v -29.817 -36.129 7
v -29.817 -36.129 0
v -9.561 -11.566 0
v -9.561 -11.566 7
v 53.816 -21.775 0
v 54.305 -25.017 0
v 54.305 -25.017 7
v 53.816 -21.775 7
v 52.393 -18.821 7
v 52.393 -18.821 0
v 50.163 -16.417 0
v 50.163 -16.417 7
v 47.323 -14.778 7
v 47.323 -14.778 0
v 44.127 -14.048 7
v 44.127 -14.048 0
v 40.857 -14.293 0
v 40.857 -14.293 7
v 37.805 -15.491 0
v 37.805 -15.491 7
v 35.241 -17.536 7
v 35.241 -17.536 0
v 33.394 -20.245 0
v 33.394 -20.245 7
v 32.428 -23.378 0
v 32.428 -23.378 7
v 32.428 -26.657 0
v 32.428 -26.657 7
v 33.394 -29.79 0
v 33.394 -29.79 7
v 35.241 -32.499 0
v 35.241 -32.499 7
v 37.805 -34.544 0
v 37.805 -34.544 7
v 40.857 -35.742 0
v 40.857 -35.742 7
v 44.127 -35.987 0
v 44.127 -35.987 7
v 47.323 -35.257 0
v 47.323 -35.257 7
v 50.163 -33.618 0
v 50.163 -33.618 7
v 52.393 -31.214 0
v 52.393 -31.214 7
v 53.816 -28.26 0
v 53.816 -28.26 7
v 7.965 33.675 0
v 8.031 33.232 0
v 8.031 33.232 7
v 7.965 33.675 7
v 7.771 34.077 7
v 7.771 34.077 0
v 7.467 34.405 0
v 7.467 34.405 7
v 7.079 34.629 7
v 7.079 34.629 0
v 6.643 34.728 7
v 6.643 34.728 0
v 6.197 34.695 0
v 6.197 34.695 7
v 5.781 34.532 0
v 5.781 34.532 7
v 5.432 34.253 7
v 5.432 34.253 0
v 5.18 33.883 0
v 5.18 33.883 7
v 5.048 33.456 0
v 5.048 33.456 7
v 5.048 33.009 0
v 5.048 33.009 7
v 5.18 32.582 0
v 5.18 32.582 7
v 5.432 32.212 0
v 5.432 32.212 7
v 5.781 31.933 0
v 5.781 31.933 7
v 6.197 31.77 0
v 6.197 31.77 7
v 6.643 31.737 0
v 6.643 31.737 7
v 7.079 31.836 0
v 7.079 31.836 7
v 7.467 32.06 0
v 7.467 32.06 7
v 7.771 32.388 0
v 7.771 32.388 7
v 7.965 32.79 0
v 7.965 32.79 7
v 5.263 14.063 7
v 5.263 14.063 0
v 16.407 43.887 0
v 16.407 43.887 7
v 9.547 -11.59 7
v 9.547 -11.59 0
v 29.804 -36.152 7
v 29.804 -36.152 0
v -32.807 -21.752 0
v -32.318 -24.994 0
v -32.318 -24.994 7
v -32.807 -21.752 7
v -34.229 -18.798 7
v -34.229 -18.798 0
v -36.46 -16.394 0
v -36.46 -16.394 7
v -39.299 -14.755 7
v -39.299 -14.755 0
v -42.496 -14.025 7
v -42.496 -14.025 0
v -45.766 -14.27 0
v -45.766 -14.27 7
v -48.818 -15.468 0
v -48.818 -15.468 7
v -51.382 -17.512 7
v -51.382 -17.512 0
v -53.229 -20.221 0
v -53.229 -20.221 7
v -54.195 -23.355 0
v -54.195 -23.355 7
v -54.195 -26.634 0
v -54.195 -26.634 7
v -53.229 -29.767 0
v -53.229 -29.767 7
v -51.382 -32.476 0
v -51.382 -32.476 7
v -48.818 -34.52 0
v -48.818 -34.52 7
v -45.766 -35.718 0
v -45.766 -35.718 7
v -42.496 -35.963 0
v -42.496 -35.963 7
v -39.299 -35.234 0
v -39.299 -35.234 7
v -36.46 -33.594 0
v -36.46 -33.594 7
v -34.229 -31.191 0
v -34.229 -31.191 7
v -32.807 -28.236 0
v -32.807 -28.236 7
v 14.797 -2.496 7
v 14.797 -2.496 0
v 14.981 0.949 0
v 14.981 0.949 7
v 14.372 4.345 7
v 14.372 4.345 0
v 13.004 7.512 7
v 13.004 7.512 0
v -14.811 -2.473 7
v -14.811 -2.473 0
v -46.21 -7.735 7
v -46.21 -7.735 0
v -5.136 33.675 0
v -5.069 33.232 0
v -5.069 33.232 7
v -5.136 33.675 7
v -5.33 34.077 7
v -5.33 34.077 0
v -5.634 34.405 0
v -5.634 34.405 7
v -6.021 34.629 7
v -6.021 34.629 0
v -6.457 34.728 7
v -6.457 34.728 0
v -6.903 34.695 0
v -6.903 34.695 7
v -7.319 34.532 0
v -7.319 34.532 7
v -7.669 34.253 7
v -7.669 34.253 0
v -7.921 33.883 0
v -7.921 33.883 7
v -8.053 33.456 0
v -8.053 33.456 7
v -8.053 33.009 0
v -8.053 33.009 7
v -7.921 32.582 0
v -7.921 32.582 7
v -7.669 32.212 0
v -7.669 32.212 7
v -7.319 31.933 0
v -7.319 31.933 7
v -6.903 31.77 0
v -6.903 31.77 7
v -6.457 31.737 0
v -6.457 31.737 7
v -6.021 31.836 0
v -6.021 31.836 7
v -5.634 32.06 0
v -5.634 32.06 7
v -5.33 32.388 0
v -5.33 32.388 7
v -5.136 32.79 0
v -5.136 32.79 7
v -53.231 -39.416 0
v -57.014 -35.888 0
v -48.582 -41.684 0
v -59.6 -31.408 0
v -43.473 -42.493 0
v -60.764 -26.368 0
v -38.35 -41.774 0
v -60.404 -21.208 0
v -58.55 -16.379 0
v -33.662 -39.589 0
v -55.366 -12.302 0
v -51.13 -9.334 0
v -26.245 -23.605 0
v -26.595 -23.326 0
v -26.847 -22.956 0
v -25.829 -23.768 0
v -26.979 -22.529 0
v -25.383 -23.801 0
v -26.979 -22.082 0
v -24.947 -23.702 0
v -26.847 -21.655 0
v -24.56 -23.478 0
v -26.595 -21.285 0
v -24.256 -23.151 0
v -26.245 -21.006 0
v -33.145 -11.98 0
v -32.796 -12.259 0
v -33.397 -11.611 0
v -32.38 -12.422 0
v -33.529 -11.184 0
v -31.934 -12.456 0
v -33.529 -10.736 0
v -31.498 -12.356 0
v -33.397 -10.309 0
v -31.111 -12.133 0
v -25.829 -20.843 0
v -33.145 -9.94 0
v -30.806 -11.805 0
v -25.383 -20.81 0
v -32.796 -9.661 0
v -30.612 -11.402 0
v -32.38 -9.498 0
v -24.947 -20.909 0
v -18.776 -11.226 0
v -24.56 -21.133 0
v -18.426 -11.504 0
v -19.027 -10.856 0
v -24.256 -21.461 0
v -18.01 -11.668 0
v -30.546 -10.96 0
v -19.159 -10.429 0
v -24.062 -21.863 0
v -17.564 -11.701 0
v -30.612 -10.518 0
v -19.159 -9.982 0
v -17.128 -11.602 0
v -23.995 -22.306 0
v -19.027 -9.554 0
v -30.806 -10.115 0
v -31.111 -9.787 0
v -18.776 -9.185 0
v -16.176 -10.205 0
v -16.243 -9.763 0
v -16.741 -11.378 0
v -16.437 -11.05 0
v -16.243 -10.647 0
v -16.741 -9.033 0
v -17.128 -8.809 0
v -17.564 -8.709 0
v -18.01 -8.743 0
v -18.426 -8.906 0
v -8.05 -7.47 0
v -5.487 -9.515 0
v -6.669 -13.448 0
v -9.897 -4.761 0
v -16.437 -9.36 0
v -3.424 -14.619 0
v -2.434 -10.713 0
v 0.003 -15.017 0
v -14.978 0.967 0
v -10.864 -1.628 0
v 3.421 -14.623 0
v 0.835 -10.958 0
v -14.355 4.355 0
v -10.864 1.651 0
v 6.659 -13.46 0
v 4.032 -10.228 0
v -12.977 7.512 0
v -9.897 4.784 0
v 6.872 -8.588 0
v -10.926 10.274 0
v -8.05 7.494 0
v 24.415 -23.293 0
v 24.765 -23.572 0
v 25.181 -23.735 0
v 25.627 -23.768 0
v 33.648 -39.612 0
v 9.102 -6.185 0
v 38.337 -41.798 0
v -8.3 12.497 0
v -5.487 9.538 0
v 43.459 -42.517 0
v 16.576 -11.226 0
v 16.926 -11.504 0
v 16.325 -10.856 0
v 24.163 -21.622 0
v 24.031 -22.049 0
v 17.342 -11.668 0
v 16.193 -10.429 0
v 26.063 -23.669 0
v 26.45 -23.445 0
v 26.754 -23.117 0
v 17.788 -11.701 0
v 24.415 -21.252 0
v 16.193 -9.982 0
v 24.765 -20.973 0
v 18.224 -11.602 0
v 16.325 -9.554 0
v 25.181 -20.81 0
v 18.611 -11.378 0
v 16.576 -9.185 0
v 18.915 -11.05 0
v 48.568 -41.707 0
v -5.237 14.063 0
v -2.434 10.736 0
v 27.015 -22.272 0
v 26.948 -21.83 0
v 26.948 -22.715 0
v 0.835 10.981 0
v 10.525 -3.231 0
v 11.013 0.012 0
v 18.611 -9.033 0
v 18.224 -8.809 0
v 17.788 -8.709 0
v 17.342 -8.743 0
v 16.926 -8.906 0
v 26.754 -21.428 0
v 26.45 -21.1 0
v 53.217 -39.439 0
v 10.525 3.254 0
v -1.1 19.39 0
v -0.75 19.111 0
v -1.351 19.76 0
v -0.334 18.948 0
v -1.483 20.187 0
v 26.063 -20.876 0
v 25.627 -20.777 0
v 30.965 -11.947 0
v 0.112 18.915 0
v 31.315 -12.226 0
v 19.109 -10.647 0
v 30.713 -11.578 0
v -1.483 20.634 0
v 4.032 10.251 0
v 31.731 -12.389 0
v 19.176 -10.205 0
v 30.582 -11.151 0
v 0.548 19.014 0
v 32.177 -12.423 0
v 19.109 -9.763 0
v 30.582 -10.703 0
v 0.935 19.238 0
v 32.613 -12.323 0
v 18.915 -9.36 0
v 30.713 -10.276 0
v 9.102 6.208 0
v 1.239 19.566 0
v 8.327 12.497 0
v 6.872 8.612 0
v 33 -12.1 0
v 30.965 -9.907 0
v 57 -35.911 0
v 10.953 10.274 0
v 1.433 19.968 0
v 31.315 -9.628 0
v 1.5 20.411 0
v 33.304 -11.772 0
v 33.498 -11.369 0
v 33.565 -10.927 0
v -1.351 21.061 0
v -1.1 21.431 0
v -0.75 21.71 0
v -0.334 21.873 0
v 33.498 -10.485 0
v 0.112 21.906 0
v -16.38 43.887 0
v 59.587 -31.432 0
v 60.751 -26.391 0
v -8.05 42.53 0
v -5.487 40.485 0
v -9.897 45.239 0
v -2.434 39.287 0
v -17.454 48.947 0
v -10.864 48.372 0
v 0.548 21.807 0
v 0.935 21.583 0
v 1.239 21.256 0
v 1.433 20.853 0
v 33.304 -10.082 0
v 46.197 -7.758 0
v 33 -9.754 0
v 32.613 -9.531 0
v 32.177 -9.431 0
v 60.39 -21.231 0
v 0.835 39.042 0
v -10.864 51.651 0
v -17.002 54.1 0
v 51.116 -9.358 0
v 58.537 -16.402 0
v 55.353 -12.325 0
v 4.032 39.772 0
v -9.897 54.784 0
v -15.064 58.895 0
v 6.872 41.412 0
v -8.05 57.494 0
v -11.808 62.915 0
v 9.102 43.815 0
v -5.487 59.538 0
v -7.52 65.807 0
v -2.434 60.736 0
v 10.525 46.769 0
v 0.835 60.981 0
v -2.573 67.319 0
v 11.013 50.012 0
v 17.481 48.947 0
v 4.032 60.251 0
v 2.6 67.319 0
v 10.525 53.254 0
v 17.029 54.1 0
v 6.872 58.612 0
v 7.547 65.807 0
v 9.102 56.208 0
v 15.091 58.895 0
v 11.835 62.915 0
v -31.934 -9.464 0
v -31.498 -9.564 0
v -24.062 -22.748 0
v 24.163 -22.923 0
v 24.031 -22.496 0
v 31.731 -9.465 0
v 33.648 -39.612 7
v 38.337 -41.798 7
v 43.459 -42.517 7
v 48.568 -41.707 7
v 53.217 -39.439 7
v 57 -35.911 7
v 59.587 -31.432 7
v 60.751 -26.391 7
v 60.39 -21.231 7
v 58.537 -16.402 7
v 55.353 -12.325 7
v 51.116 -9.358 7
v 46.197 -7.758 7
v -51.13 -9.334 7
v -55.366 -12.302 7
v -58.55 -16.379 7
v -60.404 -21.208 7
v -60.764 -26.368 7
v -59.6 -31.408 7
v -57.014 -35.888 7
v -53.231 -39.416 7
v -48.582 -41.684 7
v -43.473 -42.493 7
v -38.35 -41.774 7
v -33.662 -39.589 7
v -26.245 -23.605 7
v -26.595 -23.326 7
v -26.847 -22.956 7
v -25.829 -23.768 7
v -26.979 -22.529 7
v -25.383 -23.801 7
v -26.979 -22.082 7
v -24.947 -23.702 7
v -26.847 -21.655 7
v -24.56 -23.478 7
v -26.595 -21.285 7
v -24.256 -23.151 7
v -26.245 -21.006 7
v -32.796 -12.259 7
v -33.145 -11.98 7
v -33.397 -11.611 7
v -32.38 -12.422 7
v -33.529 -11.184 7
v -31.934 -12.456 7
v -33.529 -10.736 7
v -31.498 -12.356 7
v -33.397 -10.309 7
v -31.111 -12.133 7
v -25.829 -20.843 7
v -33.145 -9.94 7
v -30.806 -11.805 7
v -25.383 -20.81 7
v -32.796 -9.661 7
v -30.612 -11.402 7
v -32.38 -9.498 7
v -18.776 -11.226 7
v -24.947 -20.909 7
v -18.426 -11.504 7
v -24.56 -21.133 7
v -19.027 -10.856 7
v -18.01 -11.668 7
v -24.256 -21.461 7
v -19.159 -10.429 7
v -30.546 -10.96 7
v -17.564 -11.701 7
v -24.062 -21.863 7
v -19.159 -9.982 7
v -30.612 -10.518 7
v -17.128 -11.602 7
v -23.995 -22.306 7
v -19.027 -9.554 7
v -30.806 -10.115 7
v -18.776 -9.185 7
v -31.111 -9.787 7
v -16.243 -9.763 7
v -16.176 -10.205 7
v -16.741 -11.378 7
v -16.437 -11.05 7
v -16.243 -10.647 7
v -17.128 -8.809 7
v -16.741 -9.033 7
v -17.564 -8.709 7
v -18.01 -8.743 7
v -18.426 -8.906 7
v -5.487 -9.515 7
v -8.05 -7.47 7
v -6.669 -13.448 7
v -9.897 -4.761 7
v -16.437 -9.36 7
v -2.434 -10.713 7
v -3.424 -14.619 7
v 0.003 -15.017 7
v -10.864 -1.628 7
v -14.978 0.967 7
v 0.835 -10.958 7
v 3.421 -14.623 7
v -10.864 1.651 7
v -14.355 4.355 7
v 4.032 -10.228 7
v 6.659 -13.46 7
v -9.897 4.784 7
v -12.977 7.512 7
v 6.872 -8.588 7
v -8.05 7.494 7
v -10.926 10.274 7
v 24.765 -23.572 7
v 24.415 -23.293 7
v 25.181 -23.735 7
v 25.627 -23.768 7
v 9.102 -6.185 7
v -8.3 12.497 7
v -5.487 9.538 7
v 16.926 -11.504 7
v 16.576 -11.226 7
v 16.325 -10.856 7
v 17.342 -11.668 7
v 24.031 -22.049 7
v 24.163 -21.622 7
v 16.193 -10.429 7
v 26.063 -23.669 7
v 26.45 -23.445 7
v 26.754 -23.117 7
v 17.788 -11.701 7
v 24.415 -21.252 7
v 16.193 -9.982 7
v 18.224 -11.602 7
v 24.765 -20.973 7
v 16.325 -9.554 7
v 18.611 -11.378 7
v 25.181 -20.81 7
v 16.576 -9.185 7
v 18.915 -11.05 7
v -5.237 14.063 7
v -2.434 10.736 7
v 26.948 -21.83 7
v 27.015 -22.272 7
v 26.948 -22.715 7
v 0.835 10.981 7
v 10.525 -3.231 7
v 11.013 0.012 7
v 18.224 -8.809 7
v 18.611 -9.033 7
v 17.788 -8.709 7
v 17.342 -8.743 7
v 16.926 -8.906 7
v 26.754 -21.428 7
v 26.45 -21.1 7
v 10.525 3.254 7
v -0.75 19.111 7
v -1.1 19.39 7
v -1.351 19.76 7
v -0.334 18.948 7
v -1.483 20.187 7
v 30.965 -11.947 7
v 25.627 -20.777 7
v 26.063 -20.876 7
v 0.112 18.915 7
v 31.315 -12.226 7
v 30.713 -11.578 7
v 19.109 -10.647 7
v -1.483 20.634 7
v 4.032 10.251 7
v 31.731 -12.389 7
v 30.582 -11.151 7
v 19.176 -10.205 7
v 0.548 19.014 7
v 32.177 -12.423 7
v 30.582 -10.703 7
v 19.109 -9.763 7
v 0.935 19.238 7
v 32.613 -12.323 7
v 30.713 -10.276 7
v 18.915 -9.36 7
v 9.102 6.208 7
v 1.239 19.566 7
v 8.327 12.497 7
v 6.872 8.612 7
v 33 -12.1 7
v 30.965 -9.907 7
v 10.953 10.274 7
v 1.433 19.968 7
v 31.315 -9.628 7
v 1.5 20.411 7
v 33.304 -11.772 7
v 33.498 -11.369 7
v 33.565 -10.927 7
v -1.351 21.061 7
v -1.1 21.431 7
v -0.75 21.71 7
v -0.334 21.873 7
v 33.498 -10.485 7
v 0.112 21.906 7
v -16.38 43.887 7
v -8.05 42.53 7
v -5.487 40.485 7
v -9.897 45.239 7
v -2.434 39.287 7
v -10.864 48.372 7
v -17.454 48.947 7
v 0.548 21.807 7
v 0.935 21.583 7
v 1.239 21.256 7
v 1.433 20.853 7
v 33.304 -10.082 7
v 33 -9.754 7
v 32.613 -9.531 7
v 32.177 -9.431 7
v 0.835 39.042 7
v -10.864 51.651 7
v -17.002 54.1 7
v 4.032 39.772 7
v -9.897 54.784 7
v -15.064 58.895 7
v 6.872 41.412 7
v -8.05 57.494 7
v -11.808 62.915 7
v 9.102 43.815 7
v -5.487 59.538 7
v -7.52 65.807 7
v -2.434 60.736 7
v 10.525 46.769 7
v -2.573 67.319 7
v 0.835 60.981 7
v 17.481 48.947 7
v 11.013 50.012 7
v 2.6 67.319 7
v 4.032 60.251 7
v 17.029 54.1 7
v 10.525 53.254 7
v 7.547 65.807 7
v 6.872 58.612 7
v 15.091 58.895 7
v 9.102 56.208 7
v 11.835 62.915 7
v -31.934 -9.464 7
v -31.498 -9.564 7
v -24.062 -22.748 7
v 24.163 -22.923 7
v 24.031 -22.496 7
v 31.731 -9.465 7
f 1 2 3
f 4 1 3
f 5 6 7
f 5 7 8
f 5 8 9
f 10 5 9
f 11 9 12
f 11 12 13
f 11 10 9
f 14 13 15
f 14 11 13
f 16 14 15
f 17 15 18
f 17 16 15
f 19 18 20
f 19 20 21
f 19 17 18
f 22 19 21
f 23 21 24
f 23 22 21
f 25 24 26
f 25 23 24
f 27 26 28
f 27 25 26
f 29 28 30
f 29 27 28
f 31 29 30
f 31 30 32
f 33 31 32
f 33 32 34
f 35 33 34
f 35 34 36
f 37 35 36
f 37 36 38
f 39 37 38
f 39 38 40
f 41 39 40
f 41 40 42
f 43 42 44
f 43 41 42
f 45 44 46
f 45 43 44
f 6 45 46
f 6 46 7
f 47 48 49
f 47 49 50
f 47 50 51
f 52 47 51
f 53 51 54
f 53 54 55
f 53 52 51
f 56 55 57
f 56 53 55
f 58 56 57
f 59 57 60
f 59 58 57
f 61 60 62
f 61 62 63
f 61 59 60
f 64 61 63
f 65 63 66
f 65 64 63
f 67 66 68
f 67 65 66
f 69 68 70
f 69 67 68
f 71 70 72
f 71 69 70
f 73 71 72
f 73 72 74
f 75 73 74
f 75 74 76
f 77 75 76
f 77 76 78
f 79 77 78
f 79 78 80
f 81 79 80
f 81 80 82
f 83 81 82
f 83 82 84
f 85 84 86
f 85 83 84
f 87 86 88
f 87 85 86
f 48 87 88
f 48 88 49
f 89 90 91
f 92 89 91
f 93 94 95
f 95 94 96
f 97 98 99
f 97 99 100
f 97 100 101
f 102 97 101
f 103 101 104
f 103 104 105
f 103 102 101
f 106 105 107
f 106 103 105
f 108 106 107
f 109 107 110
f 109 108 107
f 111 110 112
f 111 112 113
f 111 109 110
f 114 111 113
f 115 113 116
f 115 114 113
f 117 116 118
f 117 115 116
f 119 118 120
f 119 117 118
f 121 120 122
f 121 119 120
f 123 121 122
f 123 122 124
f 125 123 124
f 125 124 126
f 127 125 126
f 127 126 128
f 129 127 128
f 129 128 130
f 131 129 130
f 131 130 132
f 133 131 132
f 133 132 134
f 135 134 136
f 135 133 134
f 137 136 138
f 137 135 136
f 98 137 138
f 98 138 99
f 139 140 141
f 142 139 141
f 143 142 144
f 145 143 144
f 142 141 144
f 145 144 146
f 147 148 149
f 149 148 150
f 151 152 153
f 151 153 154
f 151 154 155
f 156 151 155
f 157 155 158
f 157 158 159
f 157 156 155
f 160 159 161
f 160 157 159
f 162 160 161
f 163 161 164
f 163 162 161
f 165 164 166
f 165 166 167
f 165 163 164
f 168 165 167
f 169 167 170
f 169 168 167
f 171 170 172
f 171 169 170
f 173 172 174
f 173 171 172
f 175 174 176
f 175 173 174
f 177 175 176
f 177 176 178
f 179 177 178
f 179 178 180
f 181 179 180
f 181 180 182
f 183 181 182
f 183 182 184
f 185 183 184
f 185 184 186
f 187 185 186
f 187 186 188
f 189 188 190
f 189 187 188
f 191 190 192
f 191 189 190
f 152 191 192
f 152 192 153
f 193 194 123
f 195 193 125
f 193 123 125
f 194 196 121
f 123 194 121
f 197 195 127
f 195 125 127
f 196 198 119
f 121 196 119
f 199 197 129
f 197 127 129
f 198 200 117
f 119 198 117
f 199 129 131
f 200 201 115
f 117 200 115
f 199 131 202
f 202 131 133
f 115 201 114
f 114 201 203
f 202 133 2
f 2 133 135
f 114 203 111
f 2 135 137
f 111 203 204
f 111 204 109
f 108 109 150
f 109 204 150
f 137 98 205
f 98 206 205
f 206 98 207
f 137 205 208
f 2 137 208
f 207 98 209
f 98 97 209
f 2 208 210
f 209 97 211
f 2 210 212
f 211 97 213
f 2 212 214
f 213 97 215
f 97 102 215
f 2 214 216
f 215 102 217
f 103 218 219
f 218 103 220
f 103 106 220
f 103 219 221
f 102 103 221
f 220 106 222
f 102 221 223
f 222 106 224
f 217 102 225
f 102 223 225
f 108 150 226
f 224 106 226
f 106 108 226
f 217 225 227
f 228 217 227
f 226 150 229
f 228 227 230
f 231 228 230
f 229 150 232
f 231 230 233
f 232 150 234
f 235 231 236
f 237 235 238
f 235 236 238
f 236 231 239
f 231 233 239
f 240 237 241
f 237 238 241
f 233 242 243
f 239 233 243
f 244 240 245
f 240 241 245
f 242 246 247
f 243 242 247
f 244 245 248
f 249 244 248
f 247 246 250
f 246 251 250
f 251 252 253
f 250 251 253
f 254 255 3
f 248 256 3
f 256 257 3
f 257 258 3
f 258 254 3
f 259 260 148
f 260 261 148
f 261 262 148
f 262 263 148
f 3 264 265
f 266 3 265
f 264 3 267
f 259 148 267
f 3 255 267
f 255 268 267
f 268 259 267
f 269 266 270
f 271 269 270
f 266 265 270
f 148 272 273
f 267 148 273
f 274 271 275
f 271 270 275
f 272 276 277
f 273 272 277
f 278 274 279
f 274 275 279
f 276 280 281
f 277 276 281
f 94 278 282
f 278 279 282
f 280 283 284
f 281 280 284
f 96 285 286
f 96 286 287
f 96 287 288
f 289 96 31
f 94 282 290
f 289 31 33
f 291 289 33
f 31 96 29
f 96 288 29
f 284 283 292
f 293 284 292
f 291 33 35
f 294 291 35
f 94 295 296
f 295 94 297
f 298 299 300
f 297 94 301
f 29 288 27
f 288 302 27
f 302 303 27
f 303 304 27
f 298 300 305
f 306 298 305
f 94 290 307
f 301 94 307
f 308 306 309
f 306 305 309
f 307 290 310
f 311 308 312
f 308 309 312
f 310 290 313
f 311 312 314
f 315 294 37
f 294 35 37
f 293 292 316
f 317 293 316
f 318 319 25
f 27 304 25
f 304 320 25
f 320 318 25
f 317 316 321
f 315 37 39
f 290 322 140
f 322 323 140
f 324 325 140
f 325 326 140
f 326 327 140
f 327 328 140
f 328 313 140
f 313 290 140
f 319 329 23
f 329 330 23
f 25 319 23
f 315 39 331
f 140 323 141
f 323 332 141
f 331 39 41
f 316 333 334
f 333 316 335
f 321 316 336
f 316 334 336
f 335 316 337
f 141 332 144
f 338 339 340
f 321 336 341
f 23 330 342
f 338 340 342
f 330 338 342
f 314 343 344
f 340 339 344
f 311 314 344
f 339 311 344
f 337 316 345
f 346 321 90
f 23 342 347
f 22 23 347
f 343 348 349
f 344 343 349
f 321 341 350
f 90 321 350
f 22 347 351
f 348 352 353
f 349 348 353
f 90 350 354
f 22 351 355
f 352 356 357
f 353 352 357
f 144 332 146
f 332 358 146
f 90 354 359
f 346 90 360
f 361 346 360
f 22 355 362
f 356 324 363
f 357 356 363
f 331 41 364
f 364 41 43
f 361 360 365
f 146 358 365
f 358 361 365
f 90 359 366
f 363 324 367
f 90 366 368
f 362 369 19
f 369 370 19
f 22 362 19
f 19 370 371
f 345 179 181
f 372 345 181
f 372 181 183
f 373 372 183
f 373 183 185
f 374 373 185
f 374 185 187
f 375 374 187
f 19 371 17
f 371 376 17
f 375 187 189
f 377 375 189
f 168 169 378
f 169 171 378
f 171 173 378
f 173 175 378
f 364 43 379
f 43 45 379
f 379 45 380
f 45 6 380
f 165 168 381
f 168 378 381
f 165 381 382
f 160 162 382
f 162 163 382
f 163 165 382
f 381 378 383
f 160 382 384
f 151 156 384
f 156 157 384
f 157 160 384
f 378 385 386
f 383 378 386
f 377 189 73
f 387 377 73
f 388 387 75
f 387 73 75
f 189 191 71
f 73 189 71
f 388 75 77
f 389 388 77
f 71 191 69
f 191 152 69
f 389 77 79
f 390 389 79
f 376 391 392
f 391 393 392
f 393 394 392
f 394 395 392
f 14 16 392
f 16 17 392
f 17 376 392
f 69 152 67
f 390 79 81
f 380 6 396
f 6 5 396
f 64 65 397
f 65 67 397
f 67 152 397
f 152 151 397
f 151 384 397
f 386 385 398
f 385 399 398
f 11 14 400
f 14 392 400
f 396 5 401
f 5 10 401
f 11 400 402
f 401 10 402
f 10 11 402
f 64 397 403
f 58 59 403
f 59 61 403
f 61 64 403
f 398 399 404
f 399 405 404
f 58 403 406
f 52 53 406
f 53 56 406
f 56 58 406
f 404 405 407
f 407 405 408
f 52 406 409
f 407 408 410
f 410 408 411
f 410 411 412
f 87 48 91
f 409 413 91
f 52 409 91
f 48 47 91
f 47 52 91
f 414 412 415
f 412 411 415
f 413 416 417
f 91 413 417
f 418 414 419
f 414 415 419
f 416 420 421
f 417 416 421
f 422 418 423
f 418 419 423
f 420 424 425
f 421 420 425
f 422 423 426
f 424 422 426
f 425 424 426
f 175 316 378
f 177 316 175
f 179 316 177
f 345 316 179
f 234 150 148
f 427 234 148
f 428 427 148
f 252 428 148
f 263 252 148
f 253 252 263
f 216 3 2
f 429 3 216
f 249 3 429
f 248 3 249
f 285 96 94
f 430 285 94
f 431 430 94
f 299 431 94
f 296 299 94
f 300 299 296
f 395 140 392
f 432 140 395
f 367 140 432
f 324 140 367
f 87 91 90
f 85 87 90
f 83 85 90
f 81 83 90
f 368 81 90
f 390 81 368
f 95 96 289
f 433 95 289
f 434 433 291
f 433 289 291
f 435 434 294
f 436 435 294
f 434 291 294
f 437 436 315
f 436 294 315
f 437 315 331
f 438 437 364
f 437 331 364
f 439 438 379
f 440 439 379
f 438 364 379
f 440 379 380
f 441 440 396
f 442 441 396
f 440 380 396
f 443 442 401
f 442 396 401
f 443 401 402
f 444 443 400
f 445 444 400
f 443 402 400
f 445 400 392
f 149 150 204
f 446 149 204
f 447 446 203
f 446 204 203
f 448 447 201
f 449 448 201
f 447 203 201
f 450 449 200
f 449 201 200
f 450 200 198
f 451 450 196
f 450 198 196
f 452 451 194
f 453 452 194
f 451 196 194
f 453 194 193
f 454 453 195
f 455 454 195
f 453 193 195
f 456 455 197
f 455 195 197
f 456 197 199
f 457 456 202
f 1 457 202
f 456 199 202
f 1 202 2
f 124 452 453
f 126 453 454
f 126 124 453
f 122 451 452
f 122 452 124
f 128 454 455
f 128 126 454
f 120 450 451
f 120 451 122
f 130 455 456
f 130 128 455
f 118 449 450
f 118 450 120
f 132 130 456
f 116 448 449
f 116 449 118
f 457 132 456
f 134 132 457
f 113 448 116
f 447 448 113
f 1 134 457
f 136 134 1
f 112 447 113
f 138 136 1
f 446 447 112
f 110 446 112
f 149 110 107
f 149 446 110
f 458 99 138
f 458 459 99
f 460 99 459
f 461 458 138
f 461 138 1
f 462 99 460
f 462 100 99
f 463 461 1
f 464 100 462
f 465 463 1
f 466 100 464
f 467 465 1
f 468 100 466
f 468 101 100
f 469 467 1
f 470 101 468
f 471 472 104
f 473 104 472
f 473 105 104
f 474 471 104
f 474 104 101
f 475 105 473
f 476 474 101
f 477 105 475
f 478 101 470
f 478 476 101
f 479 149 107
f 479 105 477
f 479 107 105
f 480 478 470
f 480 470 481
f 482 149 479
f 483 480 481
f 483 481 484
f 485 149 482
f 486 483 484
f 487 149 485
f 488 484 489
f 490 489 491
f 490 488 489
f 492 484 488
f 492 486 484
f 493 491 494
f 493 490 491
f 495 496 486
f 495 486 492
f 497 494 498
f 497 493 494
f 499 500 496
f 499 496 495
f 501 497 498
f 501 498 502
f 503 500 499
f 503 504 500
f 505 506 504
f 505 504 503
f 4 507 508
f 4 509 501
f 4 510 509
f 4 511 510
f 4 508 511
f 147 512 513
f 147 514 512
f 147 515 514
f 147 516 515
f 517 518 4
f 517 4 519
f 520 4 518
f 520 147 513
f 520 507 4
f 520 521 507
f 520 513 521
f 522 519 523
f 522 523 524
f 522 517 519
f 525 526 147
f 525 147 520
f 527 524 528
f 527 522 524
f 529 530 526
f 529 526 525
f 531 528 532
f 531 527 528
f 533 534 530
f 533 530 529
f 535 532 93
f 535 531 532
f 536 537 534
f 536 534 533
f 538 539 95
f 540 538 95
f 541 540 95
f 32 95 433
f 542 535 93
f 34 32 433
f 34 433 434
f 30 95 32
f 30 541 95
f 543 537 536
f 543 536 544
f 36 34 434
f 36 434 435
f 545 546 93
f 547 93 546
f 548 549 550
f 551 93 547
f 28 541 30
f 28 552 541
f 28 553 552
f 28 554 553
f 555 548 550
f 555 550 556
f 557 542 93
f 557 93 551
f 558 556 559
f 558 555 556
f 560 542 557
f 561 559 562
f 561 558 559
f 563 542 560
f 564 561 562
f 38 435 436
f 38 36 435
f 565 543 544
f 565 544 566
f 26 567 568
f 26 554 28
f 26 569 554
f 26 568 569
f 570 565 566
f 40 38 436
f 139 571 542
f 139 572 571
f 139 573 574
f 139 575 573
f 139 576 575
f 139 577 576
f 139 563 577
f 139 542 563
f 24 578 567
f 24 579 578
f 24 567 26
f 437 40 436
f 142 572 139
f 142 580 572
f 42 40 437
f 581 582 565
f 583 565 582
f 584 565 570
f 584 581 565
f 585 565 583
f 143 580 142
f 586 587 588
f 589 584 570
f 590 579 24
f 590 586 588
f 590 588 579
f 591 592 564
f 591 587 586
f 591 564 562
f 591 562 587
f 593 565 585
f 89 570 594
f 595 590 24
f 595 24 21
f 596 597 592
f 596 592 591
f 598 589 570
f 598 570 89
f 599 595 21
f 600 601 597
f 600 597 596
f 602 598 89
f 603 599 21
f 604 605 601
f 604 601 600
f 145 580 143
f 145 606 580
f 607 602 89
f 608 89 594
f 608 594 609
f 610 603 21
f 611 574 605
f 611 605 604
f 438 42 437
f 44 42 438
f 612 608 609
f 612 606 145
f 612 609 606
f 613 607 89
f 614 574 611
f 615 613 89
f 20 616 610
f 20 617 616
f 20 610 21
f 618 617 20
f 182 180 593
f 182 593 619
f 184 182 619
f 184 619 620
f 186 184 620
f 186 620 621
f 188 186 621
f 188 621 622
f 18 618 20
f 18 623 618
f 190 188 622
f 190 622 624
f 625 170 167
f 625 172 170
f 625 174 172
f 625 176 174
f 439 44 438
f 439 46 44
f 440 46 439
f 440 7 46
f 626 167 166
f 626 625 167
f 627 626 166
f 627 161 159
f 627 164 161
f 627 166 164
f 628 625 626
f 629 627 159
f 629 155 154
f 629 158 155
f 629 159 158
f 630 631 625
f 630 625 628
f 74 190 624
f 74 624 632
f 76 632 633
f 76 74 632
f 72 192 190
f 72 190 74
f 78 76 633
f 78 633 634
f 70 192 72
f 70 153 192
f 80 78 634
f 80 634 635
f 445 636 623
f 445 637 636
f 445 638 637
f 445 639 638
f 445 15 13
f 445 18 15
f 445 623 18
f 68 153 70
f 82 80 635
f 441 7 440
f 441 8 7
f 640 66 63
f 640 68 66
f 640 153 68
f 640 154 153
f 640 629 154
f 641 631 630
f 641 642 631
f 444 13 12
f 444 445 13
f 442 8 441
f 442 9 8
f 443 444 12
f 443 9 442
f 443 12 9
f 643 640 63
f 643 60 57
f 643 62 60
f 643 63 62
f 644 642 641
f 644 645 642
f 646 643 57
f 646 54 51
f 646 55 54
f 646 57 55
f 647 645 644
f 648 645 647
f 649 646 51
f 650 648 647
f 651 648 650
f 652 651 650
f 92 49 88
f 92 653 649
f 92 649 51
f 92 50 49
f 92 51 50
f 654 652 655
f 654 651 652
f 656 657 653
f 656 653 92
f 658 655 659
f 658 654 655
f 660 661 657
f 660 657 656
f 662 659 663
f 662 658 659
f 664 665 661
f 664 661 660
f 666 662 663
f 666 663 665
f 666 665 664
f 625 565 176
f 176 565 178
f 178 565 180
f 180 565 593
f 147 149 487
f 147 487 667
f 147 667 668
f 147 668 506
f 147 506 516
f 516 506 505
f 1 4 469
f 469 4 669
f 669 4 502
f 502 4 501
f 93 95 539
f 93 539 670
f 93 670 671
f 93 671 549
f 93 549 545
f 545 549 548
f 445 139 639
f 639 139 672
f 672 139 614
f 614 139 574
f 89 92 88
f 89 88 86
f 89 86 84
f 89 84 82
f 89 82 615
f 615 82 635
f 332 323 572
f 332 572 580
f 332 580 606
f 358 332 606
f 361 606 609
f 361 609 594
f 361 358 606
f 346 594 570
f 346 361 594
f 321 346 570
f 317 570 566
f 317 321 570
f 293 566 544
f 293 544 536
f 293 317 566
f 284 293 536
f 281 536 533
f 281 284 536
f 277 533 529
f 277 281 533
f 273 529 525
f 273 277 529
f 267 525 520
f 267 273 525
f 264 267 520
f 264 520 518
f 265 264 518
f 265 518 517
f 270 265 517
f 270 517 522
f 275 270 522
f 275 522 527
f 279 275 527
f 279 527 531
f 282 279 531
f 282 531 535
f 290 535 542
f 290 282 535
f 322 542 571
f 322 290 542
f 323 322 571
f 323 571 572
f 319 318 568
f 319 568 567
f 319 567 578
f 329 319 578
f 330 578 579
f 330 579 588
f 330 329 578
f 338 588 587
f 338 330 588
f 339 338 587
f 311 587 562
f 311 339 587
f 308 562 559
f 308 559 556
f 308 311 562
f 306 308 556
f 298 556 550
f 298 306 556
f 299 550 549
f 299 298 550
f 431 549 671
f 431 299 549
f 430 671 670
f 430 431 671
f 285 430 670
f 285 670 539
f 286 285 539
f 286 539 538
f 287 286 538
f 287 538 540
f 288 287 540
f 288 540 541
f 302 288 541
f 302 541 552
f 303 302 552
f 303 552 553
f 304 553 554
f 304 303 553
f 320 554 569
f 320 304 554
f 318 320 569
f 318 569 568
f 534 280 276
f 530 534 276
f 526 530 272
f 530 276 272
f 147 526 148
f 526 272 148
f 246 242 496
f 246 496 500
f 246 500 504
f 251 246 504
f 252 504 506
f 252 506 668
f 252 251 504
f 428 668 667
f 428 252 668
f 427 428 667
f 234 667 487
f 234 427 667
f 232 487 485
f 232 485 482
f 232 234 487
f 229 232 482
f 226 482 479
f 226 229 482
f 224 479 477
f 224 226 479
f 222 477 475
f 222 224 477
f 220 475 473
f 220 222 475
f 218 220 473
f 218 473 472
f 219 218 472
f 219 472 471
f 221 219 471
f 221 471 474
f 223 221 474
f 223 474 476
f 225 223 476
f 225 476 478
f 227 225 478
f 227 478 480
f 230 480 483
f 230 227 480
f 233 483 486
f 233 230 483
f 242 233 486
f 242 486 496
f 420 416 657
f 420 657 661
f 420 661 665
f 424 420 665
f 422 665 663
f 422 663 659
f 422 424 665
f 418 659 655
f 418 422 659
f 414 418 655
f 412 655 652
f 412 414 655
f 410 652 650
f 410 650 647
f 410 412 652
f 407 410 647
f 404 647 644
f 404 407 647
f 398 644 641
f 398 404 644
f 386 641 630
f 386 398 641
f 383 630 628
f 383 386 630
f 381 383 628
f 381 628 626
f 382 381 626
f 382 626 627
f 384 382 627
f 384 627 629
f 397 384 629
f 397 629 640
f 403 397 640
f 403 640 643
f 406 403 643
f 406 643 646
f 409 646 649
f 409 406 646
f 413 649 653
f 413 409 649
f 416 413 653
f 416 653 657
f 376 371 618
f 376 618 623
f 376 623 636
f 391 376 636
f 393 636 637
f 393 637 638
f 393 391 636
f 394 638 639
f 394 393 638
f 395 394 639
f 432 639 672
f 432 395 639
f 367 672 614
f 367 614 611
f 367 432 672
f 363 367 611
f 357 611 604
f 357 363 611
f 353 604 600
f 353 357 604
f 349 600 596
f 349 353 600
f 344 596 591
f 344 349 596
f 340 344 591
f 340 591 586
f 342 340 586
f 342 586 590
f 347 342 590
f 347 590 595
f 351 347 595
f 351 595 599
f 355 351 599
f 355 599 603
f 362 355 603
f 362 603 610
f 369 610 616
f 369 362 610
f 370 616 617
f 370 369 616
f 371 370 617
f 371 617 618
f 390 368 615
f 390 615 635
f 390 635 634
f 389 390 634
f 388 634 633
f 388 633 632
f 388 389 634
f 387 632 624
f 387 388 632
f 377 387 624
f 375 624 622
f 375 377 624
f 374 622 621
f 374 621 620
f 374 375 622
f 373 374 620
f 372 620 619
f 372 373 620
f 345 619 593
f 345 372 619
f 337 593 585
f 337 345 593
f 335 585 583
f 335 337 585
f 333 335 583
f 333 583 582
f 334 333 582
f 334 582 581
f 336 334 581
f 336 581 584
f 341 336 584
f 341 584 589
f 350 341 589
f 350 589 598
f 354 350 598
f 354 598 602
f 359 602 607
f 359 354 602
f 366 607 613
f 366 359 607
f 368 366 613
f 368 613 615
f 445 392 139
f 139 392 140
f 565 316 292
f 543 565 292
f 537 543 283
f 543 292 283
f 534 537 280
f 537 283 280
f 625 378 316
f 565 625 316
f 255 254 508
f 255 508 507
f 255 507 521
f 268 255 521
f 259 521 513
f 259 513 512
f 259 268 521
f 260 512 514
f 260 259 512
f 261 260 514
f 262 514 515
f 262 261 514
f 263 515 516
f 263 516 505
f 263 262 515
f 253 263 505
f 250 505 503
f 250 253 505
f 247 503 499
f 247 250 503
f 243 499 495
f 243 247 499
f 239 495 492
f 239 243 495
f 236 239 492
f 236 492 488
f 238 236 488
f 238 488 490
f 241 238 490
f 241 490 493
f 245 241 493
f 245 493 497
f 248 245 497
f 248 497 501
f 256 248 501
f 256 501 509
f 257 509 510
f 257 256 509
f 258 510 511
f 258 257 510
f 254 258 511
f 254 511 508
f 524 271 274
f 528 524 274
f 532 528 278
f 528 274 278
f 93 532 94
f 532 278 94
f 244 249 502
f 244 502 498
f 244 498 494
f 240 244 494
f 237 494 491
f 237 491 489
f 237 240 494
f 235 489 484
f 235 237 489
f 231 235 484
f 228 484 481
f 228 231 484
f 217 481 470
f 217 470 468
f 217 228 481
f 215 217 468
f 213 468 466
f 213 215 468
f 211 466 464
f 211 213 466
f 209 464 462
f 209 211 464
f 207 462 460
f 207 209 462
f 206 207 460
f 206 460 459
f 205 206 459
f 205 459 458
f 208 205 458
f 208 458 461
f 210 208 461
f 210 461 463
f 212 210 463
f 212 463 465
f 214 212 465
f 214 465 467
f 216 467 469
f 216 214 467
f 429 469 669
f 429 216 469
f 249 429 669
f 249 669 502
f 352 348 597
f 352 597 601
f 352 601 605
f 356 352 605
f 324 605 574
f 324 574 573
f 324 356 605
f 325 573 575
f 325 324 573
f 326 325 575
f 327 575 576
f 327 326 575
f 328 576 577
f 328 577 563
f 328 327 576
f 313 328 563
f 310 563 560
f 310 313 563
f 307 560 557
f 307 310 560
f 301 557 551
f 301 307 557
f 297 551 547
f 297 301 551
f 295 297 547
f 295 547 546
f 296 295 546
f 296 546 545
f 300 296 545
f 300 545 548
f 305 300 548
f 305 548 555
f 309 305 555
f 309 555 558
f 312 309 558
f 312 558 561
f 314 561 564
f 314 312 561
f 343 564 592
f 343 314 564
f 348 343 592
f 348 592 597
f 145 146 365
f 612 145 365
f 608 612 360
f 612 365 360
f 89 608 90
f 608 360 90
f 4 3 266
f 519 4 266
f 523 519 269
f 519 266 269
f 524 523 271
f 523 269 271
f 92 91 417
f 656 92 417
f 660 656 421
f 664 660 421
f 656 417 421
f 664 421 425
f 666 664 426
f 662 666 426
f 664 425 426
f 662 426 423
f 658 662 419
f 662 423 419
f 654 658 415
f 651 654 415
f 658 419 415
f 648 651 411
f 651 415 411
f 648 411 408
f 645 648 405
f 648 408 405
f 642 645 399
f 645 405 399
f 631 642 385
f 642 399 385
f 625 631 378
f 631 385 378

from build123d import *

# Parameters (mm, degrees)
F0_R     = 11
F0_R_2   = 1.5
F1_DEPTH = 7


with BuildPart() as f1:
    # F0 (on Top) → F1 (new body)
    with BuildSketch(Plane.XY):
        with BuildLine():
            Line((-16.379662, 43.88667), (-5.236542, 14.062915))
            ThreePointArc((-5.236542, 14.062915), (-9.677134, 11.46123), (-12.976923, 7.51167))
            ThreePointArc((-12.976923, 7.51167), (-14.764123, 2.679089), (-14.810571, -2.473169))
            Line((-14.810571, -2.473169), (-46.21026, -7.734822))
            ThreePointArc((-46.21026, -7.734822), (-58.47355, -33.74418), (-29.81714, -36.128538))
            Line((-29.81714, -36.128538), (-9.560571, -11.566436))
            ThreePointArc((-9.560571, -11.566436), (-5.07992, -14.127023), (0.003377, -15.01749))
            ThreePointArc((0.003377, -15.01749), (5.073691, -14.134569), (9.547113, -11.589746))
            Line((9.547113, -11.589746), (29.803682, -36.151848))
            ThreePointArc((29.803682, -36.151848), (58.460092, -33.76749), (46.196802, -7.758132))
            Line((46.196802, -7.758132), (14.797113, -2.496479))
            ThreePointArc((14.797113, -2.496479), (14.77432, 2.664172), (13.003839, 7.51167))
            ThreePointArc((13.003839, 7.51167), (9.70405, 11.46123), (5.263458, 14.062915))
            Line((5.263458, 14.062915), (16.406578, 43.88667))
            ThreePointArc((16.406578, 43.88667), (0.013458, 67.51167), (-16.379662, 43.88667))
        make_face()
        with Locations((-43.318105, -24.99418)):
            Circle(F0_R, mode=Mode.SUBTRACT)
        with Locations((-25.49547, -22.305525)):
            Circle(F0_R_2, mode=Mode.SUBTRACT)
        with Locations((-32.045816, -10.959994)):
            Circle(F0_R_2, mode=Mode.SUBTRACT)
        with Locations((-17.676041, -10.205267)):
            Circle(F0_R_2, mode=Mode.SUBTRACT)
        with Locations((25.514541, -22.272493)):
            Circle(F0_R_2, mode=Mode.SUBTRACT)
        with Locations((43.304647, -25.01749)):
            Circle(F0_R, mode=Mode.SUBTRACT)
        with Locations((17.676041, -10.205267)):
            Circle(F0_R_2, mode=Mode.SUBTRACT)
        with Locations((0.013458, 0.01167)):
            Circle(F0_R, mode=Mode.SUBTRACT)
        with Locations((32.064887, -10.926962)):
            Circle(F0_R_2, mode=Mode.SUBTRACT)
        with Locations((-6.569416, 33.232488)):
            Circle(F0_R_2, mode=Mode.SUBTRACT)
        with Locations((0, 20.410534)):
            Circle(F0_R_2, mode=Mode.SUBTRACT)
        with Locations((6.531274, 33.232488)):
            Circle(F0_R_2, mode=Mode.SUBTRACT)
        with Locations((0.013458, 50.01167)):
            Circle(F0_R, mode=Mode.SUBTRACT)
    extrude(amount=F1_DEPTH)


solid = f1.part
